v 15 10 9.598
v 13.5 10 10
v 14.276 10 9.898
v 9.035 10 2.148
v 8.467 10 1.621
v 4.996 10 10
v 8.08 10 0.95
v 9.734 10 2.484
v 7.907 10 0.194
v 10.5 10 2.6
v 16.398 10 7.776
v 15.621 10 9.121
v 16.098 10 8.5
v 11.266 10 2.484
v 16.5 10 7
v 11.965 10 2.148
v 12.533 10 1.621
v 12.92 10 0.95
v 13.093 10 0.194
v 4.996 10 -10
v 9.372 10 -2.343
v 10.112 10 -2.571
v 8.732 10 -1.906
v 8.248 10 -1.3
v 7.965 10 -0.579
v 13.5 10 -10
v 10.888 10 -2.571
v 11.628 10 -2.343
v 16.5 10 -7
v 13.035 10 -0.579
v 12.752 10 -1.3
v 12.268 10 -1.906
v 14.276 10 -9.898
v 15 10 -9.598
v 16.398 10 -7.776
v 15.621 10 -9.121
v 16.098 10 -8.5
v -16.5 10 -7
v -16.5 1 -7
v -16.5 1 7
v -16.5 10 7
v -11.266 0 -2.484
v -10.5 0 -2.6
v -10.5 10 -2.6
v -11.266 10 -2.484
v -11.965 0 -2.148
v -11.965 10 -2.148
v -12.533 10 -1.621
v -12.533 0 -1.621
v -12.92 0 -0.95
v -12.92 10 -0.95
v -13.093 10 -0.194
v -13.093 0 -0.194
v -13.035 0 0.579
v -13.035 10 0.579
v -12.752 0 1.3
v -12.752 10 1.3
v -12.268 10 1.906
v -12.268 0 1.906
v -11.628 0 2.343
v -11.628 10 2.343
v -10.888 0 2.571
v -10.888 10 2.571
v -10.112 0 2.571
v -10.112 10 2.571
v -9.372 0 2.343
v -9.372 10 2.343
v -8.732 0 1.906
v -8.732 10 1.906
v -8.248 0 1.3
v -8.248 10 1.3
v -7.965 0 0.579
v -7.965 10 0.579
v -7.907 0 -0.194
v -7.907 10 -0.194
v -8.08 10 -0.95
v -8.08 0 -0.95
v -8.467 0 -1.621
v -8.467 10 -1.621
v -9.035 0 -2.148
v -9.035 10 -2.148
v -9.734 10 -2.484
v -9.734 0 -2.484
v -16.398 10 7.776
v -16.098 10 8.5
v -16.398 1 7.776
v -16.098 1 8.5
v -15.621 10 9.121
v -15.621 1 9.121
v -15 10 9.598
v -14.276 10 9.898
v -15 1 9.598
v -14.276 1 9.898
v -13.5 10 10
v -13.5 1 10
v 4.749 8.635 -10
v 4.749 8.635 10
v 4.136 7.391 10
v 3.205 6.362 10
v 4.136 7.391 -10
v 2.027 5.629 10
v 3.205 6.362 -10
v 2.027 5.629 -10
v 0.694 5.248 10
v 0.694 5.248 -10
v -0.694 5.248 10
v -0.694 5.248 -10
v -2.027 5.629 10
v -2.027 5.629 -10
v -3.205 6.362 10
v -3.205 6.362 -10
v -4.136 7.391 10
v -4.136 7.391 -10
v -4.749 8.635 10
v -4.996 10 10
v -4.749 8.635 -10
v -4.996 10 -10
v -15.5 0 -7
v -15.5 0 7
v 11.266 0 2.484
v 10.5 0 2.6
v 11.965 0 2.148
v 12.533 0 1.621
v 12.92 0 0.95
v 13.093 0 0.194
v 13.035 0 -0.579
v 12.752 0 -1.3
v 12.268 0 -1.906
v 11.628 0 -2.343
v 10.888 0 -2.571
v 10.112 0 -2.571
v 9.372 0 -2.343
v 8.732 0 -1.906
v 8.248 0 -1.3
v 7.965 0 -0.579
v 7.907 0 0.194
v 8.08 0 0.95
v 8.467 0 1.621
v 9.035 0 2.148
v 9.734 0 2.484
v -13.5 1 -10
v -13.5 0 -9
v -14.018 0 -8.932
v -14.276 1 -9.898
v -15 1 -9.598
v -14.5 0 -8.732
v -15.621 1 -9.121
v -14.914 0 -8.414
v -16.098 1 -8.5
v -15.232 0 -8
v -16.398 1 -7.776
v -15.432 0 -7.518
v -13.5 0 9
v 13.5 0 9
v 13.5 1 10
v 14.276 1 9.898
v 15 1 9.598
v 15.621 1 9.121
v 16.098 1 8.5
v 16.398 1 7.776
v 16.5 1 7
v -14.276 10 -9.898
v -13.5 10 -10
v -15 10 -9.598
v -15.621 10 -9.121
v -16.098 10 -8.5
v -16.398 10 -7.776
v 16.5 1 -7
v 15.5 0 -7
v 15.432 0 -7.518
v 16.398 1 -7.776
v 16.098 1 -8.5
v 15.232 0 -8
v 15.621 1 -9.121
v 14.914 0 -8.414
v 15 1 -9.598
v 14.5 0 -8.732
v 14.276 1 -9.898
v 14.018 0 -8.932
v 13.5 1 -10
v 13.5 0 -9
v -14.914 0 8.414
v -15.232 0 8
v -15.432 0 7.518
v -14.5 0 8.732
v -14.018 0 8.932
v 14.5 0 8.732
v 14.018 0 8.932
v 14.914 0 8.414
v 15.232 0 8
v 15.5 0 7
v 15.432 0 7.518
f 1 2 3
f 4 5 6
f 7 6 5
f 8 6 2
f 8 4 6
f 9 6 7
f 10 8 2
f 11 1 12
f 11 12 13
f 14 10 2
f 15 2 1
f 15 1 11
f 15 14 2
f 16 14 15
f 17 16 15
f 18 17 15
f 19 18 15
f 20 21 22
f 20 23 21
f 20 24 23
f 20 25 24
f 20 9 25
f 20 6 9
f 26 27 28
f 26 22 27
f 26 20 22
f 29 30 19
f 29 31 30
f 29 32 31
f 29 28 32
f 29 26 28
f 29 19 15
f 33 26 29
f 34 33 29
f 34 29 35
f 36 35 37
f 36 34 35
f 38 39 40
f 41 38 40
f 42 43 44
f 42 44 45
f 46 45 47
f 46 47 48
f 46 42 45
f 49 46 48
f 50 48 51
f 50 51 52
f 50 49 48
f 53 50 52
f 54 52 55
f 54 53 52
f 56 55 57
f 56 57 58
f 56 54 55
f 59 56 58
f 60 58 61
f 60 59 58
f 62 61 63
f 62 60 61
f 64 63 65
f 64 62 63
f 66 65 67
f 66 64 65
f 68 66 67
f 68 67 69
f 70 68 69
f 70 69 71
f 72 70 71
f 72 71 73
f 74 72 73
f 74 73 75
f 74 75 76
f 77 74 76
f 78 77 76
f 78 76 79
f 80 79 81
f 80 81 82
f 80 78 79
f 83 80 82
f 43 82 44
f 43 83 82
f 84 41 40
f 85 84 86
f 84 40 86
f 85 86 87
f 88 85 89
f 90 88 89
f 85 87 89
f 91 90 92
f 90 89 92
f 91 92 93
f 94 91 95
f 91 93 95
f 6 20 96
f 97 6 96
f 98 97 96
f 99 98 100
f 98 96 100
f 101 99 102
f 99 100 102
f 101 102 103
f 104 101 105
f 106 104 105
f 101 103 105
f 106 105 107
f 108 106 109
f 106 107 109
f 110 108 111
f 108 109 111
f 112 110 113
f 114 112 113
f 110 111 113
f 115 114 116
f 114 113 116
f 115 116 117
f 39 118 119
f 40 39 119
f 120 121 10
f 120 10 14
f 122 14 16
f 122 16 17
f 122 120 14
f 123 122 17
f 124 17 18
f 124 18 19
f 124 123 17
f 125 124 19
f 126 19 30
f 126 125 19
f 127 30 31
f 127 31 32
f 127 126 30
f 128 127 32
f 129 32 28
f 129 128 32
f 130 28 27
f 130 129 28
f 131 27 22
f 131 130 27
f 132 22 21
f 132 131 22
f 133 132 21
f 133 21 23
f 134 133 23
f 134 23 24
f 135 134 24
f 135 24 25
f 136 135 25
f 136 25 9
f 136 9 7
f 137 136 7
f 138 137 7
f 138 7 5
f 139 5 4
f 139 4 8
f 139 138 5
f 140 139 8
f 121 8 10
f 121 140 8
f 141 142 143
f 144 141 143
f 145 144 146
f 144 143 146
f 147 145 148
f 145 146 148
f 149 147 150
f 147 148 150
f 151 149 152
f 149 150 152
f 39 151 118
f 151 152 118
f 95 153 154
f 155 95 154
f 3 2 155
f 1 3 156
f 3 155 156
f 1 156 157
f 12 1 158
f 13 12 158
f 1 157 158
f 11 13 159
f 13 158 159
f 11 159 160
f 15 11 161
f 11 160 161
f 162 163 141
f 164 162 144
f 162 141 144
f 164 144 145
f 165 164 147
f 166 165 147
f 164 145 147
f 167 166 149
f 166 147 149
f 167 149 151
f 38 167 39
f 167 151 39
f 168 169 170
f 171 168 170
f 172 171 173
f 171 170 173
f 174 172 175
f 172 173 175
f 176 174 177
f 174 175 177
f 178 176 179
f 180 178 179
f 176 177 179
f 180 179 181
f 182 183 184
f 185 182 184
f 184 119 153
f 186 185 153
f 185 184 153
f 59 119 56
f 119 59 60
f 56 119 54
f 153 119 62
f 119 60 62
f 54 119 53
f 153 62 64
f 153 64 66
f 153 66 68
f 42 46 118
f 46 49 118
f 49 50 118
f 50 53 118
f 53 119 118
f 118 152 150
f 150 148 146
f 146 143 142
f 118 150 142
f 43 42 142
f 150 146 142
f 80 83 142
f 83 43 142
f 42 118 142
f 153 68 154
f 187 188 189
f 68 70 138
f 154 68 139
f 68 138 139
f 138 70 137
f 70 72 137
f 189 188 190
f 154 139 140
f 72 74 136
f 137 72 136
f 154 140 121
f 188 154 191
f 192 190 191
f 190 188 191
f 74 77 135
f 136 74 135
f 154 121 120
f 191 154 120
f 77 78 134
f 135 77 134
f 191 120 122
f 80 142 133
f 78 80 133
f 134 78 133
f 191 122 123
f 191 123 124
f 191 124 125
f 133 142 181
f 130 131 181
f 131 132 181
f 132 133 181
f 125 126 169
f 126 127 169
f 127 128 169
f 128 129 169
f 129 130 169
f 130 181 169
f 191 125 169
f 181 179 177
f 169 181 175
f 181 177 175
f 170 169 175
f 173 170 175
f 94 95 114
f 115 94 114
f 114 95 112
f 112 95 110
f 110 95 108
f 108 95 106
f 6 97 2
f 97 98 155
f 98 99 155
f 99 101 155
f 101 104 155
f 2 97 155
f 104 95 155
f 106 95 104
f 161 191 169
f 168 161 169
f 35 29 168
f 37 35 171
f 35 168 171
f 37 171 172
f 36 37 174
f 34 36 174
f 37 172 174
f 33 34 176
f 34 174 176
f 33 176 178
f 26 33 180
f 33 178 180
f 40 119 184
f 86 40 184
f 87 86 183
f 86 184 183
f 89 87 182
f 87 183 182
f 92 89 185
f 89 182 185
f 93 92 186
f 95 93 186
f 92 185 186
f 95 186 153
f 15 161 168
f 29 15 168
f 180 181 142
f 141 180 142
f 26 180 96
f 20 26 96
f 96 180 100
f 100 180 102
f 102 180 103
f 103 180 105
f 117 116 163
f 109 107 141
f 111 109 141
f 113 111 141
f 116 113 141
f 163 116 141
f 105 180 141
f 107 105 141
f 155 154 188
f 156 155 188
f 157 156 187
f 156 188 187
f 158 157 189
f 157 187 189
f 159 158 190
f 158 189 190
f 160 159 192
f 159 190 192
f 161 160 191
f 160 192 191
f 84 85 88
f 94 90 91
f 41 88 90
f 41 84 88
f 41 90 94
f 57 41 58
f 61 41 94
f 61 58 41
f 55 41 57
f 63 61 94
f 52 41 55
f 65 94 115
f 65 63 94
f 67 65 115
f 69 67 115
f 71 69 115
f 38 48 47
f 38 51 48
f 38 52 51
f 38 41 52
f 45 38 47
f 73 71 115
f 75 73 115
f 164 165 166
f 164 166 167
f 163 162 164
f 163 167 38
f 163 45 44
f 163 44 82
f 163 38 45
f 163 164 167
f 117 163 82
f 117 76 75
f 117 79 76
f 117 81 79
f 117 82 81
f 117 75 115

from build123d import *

# Parameters (mm, degrees)
SKETCH1_R           = 2.6
BOSS_EXTRUDE3_DEPTH = 10
SKETCH5_R           = 5
CUT_EXTRUDE3_DEPTH  = 20
CHAMFER1_SIZE       = 1


with BuildPart() as part:
    # Sketch1 → Boss-Extrude3 (new body)
    with BuildSketch(Plane(origin=(0, 0, 0), x_dir=(1, 0, 0), z_dir=(0, 1, 0))):
        with BuildLine():
            Line((-13.5, -10), (13.5, -10))
            ThreePointArc((13.5, -10), (15.621320344, -9.121320344), (16.5, -7))
            Line((16.5, -7), (16.5, 7))
            ThreePointArc((16.5, 7), (15.621320344, 9.121320344), (13.5, 10))
            Line((13.5, 10), (-13.5, 10))
            ThreePointArc((-13.5, 10), (-15.621320344, 9.121320344), (-16.5, 7))
            Line((-16.5, 7), (-16.5, -7))
            ThreePointArc((-16.5, -7), (-15.621320344, -9.121320344), (-13.5, -10))
        make_face()
        with Locations(Location((10.5, 0, 0), (0, 0, 270))):
            Circle(SKETCH1_R, mode=Mode.SUBTRACT)
        with Locations(Location((-10.5, 0, 0), (0, 0, 90))):
            Circle(SKETCH1_R, mode=Mode.SUBTRACT)
    extrude(amount=BOSS_EXTRUDE3_DEPTH)

    # Sketch5 → Cut-Extrude3 (cut)
    with BuildSketch(Plane(origin=(0, 0, -10), x_dir=(-1, 0, 0), z_dir=(0, 0, -1))):
        with Locations((0, 10.2)):
            Circle(SKETCH5_R)
    extrude(amount=-CUT_EXTRUDE3_DEPTH, mode=Mode.SUBTRACT)

    # Chamfer1
    chamfer1_edges = [part.edges().sort_by_distance(p)[0] for p in [
        (0, 0, 10),
        (-15.621320344, 0, 9.121320344),
        (-16.5, 0, 0),
        (-15.621320344, 0, -9.121320344),
        (0, 0, -10),
        (15.621320344, 0, -9.121320344),
        (16.5, 0, 0),
        (15.621320344, 0, 9.121320344),
    ]]
    chamfer(chamfer1_edges, length=CHAMFER1_SIZE)


solid = part.part
